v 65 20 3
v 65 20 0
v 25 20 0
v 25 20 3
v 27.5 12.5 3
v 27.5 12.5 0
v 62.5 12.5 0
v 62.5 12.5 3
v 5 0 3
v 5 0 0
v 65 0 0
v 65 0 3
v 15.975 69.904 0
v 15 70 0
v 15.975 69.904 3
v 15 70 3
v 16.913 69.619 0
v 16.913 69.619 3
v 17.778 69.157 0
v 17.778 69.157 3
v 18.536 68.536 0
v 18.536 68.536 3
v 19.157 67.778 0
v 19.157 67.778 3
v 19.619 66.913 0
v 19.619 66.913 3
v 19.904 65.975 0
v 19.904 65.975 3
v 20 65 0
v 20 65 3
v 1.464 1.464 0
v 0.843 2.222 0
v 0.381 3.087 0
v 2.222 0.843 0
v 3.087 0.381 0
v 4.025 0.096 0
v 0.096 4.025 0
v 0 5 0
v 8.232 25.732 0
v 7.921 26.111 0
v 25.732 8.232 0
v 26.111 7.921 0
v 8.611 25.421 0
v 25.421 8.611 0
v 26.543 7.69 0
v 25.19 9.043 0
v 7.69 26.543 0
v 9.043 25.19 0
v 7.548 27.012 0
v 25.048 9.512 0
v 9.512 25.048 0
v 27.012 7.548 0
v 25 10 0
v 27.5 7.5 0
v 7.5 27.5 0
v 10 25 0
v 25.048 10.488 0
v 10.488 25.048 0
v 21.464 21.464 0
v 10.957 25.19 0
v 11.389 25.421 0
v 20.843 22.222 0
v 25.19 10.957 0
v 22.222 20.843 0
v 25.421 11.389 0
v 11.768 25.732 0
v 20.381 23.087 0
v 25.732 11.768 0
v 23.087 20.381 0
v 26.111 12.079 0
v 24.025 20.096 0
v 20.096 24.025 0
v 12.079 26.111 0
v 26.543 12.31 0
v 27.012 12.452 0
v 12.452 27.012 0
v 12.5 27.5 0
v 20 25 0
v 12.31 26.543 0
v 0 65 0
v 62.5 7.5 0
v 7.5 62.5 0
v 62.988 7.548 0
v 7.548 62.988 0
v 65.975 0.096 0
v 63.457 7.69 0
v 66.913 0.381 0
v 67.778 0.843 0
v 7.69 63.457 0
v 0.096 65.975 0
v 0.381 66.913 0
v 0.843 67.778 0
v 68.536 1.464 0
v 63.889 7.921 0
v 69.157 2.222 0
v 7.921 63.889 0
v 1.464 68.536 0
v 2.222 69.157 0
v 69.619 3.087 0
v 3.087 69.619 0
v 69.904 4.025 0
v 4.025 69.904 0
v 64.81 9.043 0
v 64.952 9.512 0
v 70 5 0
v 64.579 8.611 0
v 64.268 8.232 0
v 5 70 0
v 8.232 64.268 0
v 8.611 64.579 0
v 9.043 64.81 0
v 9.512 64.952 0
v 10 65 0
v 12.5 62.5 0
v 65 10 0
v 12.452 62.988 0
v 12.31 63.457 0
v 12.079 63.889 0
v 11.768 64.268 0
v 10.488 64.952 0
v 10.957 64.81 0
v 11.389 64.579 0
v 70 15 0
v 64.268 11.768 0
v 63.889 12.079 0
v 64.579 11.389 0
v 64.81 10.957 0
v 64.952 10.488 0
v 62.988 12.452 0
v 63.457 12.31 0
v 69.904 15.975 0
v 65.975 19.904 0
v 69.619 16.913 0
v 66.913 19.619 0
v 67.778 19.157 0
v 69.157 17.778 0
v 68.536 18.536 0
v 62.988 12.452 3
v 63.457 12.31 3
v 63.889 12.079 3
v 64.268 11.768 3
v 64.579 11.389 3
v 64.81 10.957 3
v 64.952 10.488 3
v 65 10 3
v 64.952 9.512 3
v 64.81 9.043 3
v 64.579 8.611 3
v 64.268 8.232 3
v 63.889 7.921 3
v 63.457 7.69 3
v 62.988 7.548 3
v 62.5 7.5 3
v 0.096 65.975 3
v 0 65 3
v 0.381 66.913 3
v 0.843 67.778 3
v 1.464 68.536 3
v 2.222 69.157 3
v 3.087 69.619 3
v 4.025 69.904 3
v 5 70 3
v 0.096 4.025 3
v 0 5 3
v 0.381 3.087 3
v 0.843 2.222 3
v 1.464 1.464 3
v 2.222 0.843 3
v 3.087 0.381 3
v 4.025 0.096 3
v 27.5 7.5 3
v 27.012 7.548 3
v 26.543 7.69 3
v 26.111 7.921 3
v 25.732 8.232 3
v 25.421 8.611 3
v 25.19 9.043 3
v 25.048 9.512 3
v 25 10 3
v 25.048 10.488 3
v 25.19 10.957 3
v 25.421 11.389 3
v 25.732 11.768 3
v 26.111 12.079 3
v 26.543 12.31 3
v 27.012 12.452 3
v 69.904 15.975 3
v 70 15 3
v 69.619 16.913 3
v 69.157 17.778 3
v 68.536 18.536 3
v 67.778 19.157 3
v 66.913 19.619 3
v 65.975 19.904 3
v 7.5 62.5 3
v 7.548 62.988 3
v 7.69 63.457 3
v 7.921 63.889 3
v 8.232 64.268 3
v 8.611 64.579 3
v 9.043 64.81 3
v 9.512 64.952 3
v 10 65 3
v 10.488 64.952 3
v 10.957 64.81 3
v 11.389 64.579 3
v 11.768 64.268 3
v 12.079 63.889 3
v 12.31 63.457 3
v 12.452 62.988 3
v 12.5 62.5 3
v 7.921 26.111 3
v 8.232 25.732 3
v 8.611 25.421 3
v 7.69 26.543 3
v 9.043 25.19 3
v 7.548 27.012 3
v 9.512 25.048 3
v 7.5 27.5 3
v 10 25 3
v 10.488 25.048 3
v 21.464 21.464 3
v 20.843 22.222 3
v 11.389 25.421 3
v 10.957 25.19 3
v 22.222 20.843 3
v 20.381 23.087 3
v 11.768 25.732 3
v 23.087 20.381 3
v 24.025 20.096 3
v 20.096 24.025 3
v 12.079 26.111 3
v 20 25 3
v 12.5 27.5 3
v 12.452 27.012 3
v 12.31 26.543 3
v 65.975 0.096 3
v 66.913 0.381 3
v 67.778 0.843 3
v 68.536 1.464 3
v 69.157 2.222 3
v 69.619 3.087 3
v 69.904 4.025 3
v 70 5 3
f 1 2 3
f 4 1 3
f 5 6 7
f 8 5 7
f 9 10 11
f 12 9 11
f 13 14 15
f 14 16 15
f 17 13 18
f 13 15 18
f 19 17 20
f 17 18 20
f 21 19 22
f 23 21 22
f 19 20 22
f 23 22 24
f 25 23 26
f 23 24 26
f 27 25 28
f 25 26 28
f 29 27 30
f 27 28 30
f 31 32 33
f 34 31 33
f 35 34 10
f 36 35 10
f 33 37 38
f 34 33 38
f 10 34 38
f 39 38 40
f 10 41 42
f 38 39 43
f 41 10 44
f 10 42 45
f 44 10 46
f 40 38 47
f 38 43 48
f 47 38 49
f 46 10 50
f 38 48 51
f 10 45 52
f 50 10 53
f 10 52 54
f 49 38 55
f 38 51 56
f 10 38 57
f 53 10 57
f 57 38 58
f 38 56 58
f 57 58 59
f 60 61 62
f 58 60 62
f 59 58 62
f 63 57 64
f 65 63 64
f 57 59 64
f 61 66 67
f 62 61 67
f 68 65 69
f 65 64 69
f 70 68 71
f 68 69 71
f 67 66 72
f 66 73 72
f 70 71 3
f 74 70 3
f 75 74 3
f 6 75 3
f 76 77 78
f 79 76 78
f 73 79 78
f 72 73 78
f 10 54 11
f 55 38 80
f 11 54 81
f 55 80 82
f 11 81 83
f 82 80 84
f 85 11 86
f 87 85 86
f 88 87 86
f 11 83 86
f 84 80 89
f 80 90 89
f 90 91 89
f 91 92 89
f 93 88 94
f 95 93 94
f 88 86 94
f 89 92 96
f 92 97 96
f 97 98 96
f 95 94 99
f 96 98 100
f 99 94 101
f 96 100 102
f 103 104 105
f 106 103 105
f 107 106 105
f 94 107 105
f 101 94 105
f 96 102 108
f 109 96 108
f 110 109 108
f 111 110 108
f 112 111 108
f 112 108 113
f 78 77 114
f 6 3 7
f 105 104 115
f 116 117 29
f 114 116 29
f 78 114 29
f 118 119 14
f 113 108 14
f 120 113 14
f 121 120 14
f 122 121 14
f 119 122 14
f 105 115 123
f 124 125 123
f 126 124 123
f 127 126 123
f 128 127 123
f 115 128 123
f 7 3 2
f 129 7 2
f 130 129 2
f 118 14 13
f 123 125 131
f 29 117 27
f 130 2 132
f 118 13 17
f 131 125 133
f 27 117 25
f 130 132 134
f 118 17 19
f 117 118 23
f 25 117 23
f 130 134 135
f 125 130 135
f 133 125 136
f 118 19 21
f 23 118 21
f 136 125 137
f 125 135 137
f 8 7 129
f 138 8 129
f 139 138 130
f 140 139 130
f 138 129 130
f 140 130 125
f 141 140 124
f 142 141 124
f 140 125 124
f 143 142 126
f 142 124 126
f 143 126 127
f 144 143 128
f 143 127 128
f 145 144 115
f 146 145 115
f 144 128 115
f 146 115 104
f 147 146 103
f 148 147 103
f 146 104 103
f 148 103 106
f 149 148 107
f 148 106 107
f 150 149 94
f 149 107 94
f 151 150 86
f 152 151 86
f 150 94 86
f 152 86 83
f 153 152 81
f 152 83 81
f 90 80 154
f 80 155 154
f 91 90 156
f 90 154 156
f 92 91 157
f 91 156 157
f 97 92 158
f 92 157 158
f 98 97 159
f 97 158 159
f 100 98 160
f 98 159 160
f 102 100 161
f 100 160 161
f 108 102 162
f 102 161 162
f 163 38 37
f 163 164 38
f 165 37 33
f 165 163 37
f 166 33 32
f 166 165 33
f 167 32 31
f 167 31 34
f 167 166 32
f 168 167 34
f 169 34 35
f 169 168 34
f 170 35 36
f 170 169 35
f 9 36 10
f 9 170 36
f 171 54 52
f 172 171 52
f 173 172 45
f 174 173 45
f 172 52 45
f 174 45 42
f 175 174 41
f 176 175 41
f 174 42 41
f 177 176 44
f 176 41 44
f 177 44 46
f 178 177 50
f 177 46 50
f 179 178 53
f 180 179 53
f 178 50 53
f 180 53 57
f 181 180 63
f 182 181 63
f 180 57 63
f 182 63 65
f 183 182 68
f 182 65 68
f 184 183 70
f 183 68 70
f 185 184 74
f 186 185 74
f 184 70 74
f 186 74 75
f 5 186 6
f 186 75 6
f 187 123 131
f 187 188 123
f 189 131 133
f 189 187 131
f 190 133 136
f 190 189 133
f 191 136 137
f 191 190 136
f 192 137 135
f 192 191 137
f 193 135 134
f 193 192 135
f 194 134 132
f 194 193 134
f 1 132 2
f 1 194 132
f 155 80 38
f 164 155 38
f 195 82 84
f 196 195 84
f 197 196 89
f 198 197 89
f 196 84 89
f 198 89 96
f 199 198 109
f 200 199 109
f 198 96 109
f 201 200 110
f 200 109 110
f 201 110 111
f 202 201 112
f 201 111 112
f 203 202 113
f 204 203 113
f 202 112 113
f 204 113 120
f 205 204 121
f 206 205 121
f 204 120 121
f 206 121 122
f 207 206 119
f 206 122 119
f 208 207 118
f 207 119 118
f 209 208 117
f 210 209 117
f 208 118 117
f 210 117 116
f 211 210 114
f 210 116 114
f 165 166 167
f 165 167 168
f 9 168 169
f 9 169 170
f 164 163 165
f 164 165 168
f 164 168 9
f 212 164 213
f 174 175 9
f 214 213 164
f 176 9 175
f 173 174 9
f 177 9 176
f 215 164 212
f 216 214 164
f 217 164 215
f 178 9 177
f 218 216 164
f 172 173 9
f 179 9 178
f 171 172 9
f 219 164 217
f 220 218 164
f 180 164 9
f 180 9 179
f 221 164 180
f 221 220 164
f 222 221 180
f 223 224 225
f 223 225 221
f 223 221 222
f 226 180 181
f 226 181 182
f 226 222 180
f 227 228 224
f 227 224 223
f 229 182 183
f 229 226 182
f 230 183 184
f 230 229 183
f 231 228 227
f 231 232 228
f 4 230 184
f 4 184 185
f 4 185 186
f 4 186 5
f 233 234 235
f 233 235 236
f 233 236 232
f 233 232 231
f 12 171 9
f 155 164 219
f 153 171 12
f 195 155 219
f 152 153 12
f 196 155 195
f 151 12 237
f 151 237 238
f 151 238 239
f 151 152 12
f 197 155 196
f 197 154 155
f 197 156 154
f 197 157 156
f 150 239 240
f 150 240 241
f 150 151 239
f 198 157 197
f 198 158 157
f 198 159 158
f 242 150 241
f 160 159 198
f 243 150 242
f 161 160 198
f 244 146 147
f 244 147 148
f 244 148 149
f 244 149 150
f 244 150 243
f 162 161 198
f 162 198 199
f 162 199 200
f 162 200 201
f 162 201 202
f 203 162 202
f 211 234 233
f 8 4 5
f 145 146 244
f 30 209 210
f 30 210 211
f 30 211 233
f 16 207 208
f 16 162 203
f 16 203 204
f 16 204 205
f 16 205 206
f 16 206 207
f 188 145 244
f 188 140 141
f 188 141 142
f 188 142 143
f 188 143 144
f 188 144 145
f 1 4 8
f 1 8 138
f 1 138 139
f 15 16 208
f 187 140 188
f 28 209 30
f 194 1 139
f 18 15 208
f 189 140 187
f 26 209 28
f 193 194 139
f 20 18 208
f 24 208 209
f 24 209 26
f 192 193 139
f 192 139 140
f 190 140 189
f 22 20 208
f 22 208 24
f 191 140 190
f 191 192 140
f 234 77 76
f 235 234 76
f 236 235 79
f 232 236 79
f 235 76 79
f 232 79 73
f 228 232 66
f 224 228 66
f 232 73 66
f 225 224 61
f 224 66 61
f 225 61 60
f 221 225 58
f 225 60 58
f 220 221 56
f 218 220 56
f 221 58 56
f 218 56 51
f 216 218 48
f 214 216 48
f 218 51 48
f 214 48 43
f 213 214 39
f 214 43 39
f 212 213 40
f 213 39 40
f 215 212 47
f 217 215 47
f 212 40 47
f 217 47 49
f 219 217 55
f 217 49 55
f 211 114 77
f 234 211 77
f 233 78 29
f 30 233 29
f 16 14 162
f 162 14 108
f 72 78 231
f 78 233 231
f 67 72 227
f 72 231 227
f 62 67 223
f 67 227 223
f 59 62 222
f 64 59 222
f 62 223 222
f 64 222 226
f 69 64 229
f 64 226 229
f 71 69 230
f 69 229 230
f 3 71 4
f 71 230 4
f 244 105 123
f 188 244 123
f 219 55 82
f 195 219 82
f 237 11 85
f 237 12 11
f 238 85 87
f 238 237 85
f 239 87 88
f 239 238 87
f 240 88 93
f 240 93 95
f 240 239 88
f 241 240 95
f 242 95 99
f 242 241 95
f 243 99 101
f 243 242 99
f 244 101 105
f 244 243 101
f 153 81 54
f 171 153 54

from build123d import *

# Parameters (mm, degrees)
BOSS_EXTRUDE1_DEPTH = 3
FILLET1_R           = 5


with BuildPart() as part:
    # Sketch1 → Boss-Extrude1 (new body)
    with BuildSketch(Plane.XY):
        Polygon((0, 70), (0, 0), (70, 0), (70, 20), (20, 20), (20, 70), align=None)
        with BuildLine():
            Line((12.5, 62.5), (12.5, 27.5))
            ThreePointArc((12.5, 27.5), (10, 25), (7.5, 27.5))
            Line((7.5, 27.5), (7.5, 62.5))
            ThreePointArc((7.5, 62.5), (10, 65), (12.5, 62.5))
        make_face(mode=Mode.SUBTRACT)
        with BuildLine():
            Line((62.5, 7.5), (27.5, 7.5))
            ThreePointArc((27.5, 7.5), (25, 10), (27.5, 12.5))
            Line((27.5, 12.5), (62.5, 12.5))
            ThreePointArc((62.5, 12.5), (65, 10), (62.5, 7.5))
        make_face(mode=Mode.SUBTRACT)
    extrude(amount=BOSS_EXTRUDE1_DEPTH)

    # Fillet1
    fillet1_edges = [part.edges().sort_by_distance(p)[0] for p in [
        (20, 70, 1.5),
        (20, 20, 1.5),
        (70, 20, 1.5),
        (70, 0, 1.5),
        (0, 0, 1.5),
        (0, 70, 1.5),
    ]]
    fillet(fillet1_edges, radius=FILLET1_R)


solid = part.part
